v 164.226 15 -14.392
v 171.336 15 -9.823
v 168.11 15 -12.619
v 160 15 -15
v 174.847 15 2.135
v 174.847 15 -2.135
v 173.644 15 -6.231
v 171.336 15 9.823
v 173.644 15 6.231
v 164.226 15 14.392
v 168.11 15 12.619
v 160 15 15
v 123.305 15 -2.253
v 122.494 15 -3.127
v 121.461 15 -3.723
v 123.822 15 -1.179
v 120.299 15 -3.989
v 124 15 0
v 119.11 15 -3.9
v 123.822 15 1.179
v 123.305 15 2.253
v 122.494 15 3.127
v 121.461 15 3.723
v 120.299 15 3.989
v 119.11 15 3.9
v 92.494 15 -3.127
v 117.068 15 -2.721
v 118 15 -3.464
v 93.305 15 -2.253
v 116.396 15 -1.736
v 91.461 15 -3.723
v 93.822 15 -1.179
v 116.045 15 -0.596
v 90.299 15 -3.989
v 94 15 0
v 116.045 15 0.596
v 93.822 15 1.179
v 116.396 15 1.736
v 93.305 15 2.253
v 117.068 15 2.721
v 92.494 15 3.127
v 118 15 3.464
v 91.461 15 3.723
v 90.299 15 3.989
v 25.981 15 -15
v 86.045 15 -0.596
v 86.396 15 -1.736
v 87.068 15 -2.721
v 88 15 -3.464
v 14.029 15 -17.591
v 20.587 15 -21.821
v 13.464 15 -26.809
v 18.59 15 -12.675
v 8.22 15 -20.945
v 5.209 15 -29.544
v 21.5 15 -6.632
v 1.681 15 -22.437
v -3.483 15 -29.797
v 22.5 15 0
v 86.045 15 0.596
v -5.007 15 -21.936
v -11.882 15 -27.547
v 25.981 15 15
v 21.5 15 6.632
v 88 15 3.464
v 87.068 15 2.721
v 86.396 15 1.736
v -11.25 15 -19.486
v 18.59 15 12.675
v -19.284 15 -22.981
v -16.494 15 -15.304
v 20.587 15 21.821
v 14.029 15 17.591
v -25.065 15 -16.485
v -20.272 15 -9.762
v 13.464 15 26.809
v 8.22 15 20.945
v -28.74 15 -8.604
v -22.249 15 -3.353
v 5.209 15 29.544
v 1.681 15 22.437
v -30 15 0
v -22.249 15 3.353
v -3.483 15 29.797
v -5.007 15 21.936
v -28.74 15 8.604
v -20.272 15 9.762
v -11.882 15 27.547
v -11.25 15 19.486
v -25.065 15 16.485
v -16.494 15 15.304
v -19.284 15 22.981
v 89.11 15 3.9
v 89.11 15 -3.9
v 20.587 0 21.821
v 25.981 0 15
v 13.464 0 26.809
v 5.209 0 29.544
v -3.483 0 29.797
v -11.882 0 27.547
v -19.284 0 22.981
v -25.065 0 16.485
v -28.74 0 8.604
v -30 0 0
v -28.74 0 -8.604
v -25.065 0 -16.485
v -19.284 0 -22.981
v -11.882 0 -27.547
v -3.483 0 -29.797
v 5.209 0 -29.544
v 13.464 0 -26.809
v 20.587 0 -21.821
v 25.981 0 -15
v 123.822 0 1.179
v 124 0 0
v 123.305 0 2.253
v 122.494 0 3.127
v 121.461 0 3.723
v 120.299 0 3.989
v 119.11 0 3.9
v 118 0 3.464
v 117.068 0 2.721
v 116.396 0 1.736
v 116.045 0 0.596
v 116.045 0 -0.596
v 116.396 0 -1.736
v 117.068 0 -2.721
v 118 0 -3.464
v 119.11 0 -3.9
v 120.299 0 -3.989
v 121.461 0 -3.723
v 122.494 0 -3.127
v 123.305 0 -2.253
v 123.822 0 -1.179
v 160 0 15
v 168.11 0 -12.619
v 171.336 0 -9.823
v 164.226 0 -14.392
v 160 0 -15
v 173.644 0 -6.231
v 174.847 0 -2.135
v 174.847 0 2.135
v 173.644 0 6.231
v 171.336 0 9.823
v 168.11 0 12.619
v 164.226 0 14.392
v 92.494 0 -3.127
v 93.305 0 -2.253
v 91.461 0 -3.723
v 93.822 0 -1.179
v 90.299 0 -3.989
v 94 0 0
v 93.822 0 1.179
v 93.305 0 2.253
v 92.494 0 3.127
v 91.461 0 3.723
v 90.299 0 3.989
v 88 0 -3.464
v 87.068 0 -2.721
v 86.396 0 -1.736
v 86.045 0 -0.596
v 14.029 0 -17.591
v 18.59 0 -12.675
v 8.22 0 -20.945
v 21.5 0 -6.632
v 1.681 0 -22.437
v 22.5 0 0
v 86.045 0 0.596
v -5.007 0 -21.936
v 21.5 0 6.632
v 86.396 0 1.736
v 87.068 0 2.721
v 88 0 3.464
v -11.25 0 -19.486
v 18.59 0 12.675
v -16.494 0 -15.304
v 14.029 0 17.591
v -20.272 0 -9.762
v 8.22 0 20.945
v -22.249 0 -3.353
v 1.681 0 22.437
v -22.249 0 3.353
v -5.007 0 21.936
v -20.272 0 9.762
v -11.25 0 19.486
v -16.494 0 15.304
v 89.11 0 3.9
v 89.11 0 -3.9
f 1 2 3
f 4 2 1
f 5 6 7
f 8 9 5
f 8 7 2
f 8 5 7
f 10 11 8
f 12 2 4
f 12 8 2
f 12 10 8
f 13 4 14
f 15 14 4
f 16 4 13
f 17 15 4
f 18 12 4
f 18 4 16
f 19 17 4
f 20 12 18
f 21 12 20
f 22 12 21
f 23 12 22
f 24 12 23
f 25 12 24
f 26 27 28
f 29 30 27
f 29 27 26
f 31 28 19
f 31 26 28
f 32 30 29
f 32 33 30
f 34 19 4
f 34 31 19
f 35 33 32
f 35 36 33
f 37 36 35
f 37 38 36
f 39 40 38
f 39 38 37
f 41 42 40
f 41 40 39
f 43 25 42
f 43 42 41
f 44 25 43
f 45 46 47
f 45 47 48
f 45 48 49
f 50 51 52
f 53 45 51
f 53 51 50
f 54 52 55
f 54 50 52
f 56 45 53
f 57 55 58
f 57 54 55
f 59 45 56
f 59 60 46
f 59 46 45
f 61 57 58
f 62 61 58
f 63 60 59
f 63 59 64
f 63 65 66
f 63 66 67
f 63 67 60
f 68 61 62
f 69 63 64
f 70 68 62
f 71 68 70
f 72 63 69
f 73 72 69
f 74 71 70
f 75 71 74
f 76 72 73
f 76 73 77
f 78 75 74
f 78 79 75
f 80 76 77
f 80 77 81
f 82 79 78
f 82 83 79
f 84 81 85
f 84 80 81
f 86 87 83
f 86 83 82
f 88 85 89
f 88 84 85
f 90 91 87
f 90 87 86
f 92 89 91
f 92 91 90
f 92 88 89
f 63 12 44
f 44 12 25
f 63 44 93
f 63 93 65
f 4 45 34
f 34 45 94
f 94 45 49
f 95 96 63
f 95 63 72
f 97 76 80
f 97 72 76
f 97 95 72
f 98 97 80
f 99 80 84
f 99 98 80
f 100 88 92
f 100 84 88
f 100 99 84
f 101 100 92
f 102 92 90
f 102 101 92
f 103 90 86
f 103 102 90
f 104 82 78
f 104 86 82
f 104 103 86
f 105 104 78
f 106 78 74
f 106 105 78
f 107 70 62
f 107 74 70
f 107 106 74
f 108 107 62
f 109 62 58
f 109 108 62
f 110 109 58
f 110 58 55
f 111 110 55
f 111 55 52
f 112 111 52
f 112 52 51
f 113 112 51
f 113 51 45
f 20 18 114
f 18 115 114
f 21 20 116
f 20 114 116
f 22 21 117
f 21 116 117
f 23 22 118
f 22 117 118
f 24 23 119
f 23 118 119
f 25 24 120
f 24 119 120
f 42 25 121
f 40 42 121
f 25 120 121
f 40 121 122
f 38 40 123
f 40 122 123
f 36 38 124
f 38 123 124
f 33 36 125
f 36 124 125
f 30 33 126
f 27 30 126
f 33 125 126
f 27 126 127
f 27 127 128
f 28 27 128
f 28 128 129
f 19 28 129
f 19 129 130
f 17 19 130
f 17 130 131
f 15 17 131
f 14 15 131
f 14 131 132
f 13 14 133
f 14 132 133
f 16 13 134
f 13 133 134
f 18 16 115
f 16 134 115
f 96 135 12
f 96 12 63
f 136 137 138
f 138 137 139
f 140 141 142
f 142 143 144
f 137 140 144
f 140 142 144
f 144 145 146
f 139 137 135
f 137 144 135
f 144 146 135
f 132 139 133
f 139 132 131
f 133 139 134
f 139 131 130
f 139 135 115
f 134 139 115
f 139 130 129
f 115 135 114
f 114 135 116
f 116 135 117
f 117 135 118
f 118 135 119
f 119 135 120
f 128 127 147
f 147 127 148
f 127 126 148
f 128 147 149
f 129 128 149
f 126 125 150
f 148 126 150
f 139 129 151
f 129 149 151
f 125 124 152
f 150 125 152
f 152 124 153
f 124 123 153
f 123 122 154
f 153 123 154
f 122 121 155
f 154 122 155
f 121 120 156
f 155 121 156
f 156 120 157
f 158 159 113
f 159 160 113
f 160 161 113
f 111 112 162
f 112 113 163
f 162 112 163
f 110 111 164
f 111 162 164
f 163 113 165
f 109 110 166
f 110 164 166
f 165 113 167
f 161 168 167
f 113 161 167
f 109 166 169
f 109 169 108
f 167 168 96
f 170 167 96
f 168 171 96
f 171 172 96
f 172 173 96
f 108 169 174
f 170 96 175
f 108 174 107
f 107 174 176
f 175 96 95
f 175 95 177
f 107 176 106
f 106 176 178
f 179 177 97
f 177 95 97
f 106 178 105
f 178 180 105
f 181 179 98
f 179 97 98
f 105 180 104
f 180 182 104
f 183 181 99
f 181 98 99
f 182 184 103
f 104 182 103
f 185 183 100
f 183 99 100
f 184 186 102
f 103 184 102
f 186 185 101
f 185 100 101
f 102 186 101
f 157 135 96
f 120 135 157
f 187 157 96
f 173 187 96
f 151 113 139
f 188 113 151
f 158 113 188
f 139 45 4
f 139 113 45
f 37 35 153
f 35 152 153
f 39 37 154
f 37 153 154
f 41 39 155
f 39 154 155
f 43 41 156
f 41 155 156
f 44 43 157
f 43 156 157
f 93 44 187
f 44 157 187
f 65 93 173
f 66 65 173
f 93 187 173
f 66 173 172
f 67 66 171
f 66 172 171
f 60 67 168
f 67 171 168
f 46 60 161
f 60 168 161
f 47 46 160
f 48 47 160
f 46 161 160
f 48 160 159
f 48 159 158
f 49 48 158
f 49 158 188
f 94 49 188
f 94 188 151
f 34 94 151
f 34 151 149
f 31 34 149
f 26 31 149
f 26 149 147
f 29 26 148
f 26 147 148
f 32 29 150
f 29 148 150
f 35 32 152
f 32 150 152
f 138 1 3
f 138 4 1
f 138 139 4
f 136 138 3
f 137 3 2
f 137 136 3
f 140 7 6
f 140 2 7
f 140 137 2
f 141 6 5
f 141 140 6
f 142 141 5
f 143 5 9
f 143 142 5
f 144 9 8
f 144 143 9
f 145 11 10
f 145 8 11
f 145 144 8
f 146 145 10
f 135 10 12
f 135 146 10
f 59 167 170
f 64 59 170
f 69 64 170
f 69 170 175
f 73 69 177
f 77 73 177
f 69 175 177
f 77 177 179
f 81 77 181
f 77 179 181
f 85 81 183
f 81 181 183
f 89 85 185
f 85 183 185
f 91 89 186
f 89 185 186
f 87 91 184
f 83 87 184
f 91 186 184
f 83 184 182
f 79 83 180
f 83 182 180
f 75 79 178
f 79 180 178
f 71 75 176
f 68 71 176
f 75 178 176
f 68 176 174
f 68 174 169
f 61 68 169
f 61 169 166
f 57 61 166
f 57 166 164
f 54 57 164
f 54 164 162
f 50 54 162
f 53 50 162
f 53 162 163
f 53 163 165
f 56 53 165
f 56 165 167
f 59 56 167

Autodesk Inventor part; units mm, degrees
ref_plane "YZ Plane" through (0, 0, 0) normal (1, 0, 0) x (0, 1, 0)
ref_plane "XZ Plane" through (0, 0, 0) normal (0, 1, 0) x (-1, 0, 0)
ref_plane "XY Plane" through (0, 0, 0) normal (0, 0, 1) x (1, 0, 0)
sketch "Sketch1" plane through (0, 0, 0) normal (0, 1, 0) x (-1, 0, 0)
  point P0 (0, 0)
sketch "Sketch2" plane through (0, 0, 0) normal (0, 1, 0) x (-1, 0, 0)
  arc A0 (-25.9808, -15) -> (-25.9808, 15) centre (0, 0) ccw
  line L0 (-160, 15) -> (-25.9808, 15)
  arc A1 (-160, 15) -> (-160, -15) centre (-160, 0) ccw
  line L1 (-25.9808, -15) -> (-160, -15)
  dimension "d1" = 60
  dimension "d4" = 30
extrude "Extrusion1" add sketch "Sketch2" along normal blind 15
sketch "Sketch3" plane through (0, 0, 0) normal (0, -1, 0) x (1, 0, 0)
  circle A0 centre (0, 0) radius 22.5
  circle A1 centre (90, 0) radius 4
  line L0 (0, 0) -> (120, 0)
  circle A2 centre (120, 0) radius 4
  dimension "d7" = 45
  dimension "d17" = 8
  dimension "d18" = 120
  dimension "d19" = 8
extrude "Extrusion2" cut sketch "Sketch3" against normal blind 15
